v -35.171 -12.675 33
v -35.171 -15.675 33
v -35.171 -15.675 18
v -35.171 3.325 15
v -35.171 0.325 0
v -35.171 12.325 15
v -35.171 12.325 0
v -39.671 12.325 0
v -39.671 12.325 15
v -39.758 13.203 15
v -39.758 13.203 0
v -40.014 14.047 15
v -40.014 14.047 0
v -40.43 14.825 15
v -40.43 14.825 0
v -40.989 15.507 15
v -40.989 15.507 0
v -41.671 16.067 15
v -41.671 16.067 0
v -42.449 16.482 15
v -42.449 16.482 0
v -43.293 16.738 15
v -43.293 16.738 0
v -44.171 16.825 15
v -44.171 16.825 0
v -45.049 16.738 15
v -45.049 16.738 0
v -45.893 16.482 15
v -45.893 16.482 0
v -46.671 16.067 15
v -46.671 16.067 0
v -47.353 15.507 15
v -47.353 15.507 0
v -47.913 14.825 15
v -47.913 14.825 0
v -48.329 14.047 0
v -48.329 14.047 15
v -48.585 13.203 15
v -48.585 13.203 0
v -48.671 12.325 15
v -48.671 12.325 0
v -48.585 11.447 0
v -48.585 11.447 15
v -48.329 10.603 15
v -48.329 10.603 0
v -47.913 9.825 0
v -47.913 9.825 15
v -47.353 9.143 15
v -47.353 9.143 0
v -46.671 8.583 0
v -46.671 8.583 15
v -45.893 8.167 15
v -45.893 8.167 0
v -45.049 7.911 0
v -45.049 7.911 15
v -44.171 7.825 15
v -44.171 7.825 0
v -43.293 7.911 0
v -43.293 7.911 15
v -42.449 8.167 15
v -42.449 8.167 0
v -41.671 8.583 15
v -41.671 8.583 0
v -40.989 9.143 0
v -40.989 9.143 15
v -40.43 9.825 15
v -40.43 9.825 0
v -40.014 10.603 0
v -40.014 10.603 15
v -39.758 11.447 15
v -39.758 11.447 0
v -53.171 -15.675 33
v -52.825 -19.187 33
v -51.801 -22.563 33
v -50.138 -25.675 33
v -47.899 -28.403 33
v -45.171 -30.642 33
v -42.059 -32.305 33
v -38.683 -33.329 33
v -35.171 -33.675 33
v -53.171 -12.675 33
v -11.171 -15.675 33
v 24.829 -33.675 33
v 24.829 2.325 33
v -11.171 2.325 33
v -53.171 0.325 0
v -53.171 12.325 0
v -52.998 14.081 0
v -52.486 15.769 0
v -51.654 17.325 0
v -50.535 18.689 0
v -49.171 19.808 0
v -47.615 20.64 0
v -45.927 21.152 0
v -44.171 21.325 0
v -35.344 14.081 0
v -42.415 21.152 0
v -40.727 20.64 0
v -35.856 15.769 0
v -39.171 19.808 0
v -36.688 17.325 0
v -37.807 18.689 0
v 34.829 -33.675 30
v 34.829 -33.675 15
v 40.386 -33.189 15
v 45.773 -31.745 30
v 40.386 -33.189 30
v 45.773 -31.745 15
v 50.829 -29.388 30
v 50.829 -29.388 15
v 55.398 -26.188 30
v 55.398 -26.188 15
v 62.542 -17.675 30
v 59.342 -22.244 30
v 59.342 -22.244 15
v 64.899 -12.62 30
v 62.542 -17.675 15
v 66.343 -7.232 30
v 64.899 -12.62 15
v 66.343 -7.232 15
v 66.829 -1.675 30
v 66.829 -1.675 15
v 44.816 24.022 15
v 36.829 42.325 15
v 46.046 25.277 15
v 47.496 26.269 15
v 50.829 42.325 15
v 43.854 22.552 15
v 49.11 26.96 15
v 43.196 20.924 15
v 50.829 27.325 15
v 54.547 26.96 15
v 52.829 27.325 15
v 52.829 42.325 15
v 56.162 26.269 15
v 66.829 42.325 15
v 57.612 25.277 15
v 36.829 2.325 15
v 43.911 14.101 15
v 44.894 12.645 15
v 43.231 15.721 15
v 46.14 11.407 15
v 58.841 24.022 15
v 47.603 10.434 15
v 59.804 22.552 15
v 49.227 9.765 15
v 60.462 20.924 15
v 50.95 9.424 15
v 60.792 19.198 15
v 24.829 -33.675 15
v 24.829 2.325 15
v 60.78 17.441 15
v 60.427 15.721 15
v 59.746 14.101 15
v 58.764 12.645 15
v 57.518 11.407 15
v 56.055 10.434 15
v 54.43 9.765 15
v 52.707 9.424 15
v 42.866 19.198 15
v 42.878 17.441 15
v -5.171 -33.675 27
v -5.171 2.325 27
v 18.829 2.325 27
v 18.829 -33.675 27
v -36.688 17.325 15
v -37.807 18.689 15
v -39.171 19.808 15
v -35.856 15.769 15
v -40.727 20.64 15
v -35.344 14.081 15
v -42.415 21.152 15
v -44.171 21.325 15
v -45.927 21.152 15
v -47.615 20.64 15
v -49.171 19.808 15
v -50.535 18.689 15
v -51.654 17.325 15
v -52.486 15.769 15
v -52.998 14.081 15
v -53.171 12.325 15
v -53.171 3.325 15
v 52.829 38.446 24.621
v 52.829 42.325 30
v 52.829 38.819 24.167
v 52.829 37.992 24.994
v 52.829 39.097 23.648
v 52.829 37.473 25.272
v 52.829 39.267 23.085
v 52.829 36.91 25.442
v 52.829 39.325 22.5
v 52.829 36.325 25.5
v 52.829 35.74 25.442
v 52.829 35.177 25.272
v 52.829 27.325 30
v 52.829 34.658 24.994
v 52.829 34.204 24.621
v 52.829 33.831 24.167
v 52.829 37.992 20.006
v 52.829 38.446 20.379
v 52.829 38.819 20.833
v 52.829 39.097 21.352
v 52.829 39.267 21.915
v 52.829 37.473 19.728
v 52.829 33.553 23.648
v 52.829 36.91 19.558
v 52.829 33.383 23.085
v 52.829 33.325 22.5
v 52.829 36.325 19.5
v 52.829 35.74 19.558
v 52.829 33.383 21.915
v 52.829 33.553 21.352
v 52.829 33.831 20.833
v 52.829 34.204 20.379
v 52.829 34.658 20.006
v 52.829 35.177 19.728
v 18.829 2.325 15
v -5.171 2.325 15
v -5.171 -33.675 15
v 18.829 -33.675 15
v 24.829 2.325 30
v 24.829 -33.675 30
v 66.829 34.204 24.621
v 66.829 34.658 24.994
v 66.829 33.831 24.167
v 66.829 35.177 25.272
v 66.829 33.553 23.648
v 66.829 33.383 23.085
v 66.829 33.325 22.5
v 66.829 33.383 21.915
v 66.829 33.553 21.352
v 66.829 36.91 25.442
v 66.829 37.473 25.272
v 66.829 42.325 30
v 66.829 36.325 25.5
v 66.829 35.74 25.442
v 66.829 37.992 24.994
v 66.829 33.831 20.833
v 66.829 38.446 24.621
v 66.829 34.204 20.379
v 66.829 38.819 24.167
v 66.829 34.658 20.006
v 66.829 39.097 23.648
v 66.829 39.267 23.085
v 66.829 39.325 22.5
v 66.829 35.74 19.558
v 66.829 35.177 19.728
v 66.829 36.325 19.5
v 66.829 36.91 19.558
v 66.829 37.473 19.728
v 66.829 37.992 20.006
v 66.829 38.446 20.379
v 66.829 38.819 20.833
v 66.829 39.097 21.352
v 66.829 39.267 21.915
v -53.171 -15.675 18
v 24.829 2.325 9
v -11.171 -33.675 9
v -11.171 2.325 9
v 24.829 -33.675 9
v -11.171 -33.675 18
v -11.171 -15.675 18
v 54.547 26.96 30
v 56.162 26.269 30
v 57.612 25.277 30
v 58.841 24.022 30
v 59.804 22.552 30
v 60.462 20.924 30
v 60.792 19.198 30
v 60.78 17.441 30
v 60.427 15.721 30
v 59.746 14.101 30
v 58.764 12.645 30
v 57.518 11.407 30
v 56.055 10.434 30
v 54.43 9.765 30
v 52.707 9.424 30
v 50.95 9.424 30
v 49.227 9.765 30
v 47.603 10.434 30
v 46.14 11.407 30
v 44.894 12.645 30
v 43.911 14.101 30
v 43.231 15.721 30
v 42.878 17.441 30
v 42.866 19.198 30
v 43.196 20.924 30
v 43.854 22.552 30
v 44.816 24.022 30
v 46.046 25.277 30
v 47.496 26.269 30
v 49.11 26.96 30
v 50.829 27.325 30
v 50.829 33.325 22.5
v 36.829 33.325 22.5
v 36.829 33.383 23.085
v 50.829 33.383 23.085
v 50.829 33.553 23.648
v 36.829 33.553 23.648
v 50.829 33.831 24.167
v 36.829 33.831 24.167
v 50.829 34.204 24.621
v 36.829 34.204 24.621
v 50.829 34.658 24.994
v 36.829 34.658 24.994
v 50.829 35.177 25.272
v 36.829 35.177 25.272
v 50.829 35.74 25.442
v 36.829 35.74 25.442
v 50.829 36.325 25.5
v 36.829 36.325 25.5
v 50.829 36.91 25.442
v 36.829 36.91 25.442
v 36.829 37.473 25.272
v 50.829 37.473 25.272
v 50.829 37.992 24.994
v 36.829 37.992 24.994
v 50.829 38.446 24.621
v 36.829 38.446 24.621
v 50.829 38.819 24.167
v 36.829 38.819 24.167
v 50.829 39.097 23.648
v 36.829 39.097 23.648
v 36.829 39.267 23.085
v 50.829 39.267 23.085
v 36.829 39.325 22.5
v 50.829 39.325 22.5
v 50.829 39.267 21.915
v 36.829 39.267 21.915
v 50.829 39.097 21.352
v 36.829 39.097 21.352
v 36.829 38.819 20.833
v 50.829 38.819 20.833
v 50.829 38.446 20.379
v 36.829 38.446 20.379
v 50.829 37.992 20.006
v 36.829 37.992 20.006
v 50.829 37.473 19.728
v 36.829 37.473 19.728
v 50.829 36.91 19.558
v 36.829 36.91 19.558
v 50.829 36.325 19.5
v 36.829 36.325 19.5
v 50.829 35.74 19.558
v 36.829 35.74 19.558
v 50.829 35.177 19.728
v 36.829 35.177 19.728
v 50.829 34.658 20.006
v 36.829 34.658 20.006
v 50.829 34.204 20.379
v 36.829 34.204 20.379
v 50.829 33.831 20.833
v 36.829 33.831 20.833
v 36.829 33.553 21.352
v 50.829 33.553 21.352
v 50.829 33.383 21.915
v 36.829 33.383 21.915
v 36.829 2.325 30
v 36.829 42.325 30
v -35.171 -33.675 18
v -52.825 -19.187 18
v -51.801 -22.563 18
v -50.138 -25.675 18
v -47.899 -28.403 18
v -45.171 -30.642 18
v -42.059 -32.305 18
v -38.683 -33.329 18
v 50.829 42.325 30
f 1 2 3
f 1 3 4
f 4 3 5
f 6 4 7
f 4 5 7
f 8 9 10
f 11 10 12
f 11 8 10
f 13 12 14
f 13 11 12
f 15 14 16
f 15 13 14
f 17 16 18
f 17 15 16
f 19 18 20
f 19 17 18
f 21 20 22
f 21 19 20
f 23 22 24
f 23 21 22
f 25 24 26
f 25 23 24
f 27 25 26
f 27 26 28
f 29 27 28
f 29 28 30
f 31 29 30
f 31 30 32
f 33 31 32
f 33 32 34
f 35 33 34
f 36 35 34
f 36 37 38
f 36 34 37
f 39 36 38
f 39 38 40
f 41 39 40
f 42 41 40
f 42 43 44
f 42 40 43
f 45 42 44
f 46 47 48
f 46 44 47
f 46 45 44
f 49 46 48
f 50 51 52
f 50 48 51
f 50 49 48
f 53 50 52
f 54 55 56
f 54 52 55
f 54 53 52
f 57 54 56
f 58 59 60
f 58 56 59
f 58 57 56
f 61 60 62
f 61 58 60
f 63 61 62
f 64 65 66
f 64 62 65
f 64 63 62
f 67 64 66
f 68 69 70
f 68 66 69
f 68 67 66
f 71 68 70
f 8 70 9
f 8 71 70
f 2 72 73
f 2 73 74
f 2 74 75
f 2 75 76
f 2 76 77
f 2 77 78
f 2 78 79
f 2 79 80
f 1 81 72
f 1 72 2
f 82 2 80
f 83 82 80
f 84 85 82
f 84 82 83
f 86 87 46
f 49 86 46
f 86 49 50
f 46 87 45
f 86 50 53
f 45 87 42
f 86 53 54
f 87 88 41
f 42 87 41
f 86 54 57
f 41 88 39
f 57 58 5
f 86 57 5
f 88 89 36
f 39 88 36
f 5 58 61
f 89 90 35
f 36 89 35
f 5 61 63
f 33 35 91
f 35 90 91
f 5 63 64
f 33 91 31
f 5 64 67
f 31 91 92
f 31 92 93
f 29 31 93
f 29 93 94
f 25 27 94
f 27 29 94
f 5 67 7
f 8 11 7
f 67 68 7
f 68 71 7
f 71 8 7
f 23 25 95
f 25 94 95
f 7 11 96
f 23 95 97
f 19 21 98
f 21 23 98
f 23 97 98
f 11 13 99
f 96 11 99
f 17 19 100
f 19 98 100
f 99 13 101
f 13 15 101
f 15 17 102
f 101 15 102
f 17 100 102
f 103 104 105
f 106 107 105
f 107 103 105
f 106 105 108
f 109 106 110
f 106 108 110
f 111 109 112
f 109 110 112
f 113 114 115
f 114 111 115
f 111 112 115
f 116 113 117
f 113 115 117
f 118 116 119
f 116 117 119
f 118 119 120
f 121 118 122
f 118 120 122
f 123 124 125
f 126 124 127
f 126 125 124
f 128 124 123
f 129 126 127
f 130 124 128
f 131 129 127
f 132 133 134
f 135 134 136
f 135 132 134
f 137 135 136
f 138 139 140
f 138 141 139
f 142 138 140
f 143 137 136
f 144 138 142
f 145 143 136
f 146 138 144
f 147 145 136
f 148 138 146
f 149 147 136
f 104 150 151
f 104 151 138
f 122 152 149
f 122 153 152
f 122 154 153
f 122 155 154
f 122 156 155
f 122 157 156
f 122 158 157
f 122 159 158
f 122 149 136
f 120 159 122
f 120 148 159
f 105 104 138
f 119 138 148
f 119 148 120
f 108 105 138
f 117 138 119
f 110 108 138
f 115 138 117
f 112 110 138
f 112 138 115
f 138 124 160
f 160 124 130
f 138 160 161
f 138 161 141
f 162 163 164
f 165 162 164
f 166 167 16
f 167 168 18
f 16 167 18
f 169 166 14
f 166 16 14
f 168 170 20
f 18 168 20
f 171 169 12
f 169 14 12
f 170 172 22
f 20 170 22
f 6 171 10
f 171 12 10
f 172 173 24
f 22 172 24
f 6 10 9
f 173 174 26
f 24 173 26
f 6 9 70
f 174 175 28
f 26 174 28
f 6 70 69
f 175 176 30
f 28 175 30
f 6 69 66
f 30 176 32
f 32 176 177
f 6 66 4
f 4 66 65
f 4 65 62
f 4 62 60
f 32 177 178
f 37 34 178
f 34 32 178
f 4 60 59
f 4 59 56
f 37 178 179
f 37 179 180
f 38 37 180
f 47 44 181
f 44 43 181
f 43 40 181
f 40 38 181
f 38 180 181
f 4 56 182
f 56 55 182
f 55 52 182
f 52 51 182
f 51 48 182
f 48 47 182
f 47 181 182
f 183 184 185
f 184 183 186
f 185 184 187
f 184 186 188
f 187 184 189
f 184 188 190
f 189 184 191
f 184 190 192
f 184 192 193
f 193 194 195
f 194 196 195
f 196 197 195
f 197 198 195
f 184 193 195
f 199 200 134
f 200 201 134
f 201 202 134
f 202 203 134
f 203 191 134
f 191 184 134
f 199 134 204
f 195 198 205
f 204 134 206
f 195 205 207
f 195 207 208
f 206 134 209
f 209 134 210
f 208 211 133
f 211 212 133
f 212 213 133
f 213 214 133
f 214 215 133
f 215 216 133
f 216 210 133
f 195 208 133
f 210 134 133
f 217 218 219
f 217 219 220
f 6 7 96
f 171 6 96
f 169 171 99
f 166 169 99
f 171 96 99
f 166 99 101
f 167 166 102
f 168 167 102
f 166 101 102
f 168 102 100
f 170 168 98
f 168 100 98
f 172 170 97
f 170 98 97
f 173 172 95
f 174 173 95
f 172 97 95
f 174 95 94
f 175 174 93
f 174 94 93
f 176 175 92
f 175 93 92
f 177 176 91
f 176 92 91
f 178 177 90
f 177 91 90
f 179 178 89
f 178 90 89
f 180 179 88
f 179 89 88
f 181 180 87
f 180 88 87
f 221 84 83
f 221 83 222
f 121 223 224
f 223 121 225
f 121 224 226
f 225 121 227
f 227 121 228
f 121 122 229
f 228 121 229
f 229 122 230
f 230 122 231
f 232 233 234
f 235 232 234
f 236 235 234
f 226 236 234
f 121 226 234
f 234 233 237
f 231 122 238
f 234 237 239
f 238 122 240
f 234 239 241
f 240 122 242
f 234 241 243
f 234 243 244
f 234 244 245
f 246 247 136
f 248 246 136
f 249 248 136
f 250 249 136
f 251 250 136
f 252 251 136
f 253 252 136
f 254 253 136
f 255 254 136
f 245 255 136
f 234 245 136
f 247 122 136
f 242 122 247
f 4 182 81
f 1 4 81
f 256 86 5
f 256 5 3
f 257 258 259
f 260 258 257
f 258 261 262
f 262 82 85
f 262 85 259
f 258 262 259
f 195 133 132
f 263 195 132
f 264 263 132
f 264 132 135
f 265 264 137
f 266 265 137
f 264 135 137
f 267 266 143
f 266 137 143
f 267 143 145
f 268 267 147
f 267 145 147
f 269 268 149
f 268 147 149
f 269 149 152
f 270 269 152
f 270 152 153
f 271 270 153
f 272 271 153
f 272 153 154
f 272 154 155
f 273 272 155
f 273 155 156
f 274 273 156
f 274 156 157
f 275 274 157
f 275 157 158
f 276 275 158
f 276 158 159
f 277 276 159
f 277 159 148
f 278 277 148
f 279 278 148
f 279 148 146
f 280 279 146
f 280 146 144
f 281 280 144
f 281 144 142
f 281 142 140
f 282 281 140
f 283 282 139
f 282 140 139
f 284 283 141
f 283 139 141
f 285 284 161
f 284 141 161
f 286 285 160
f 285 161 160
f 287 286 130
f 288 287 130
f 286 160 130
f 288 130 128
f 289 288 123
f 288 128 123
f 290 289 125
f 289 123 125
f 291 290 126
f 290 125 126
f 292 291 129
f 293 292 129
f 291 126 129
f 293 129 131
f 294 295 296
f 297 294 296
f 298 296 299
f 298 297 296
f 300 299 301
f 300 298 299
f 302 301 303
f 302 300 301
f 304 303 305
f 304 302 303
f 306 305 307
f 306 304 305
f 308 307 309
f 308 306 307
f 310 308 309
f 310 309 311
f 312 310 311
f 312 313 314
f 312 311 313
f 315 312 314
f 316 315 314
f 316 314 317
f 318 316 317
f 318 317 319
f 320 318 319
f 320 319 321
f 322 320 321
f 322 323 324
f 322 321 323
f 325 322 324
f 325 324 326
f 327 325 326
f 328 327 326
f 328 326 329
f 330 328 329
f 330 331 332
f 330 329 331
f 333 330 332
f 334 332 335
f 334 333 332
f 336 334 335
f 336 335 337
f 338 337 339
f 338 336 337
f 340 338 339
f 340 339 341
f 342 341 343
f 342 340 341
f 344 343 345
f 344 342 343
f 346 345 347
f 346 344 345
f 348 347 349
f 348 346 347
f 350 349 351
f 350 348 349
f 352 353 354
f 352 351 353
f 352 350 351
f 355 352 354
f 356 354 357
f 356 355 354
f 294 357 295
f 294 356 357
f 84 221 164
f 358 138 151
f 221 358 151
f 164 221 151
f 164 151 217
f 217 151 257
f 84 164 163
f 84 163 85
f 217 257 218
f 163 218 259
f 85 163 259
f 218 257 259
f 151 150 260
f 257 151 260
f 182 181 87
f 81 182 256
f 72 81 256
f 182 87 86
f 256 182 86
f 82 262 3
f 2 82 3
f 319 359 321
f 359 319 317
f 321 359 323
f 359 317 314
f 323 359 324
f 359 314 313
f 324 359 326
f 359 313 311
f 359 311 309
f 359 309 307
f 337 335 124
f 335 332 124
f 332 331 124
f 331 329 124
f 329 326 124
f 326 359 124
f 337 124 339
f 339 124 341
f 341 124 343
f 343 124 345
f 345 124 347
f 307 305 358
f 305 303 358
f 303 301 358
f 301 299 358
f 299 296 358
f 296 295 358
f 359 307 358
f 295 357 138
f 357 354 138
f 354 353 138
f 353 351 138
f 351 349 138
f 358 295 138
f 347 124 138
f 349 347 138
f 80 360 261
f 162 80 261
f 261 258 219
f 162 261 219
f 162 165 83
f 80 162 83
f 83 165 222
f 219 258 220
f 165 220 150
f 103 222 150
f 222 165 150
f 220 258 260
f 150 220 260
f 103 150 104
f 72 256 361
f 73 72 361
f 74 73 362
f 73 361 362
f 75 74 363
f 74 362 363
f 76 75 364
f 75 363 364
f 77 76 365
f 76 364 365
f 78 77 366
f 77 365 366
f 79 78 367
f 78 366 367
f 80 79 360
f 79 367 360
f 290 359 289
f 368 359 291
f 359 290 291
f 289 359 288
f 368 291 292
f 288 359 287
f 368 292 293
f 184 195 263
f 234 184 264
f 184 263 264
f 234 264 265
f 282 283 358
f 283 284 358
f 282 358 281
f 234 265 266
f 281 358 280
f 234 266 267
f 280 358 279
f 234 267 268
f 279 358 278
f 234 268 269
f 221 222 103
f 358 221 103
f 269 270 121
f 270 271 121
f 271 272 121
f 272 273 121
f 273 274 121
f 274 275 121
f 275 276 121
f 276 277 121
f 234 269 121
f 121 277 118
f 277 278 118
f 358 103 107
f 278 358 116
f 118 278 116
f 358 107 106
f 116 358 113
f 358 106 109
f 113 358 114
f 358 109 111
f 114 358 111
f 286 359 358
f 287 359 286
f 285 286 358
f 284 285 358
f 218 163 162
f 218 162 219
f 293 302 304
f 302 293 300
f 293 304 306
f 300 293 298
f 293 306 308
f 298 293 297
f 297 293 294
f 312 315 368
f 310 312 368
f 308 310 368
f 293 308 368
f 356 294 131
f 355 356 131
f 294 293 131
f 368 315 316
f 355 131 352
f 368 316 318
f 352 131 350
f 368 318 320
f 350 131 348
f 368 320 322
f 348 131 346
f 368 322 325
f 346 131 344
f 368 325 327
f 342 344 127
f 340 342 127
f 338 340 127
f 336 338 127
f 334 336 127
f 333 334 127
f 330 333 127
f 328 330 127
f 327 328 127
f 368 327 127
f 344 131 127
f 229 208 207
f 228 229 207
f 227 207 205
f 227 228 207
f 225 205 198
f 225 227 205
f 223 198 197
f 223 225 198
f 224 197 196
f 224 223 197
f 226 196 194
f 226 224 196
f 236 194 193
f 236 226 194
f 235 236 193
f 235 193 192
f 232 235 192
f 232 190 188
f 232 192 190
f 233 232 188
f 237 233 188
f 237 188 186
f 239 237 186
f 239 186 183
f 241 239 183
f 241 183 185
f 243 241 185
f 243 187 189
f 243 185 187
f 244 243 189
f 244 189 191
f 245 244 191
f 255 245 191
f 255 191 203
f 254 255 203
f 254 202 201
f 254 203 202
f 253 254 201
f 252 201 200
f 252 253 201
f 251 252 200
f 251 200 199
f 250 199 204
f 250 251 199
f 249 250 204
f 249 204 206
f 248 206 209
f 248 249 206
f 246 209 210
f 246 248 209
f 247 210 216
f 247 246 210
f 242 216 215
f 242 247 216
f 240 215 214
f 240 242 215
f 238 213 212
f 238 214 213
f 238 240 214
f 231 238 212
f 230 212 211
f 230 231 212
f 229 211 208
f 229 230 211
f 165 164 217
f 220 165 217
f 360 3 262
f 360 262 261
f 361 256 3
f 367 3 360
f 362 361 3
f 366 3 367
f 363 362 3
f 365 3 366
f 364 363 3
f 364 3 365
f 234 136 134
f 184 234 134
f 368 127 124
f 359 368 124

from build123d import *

# Parameters (mm, degrees)
SKETCH_1_R               = 4.5
EXTRUDE_2_DEPTH          = 33
CUT_EXTRUDE_3_DEPTH      = 42
SKETCH_6_W               = 24
SKETCH_6_H               = 12
CUT_EXTRUDE_4_DEPTH      = 85.587779831
CUT_EXTRUDE_5_DEPTH      = 85.587779831
CUT_EXTRUDE_5_DEPTH_BACK = 85.587779831
SKETCH_7_W               = 78
SKETCH_7_H               = 9
CUT_EXTRUDE_6_DEPTH      = 85.587779831
CUT_EXTRUDE_6_DEPTH_BACK = 85.587779831
SKETCH_8_W               = 42
SKETCH_8_H               = 6
SKETCH_8_H_2             = 3
CUT_EXTRUDE_7_DEPTH      = 105.787400596
CUT_EXTRUDE_7_DEPTH_BACK = 105.787400596
SKETCH_9_R               = 3


with BuildPart() as part:
    # 草图1 → 凸台-拉伸2 (new body)
    with BuildSketch(Plane.XY):
        with BuildLine():
            Line((52.828829832, 42.32492556), (52.828829832, 27.32492556))
            ThreePointArc((52.828829832, 27.32492556), (51.828829832, 9.38065365), (50.828829832, 27.32492556))
            Line((50.828829832, 27.32492556), (50.828829832, 42.32492556))
            Line((50.828829832, 42.32492556), (36.828829832, 42.32492556))
            Line((36.828829832, 42.32492556), (36.828829832, 2.32492556))
            Line((36.828829832, 2.32492556), (-11.171170168, 2.32492556))
            Line((-11.171170168, 2.32492556), (-11.171170168, -15.67507444))
            Line((-11.171170168, -15.67507444), (-35.171170168, -15.67507444))
            Line((-35.171170168, -15.67507444), (-35.171170168, 12.32492556))
            ThreePointArc((-35.171170168, 12.32492556), (-44.171170168, 21.32492556), (-53.171170168, 12.32492556))
            Line((-53.171170168, 12.32492556), (-53.171170168, -15.67507444))
            ThreePointArc((-53.171170168, -15.67507444), (-47.899092229, -28.402996501), (-35.171170168, -33.67507444))
            Line((-35.171170168, -33.67507444), (34.828829832, -33.67507444))
            ThreePointArc((34.828829832, -33.67507444), (57.45624683, -24.302491437), (66.828829832, -1.67507444))
            Line((66.828829832, -1.67507444), (66.828829832, 42.32492556))
            Line((66.828829832, 42.32492556), (52.828829832, 42.32492556))
        make_face()
        with Locations((-44.171170168, 12.32492556)):
            Circle(SKETCH_1_R, mode=Mode.SUBTRACT)
    extrude(amount=EXTRUDE_2_DEPTH)

    # 草图4 → 切除-拉伸3 (cut)
    with BuildSketch(Plane.ZY.offset(53.171170168)):
        Polygon((0, 0.32492556), (18, -15.67507444), (18, -33.67507444), (0, -33.67507444), align=None)
        Polygon((15, 21.32492556), (15, 3.32492556), (33, -12.67507444), (33, 21.32492556), align=None)
    extrude(amount=-CUT_EXTRUDE_3_DEPTH, mode=Mode.SUBTRACT)

    # 草图6 → 切除-拉伸4 (cut, through all)
    with BuildSketch(Plane(origin=(0, 2.32492556, 0), x_dir=(1, 0, 0), z_dir=(0, 1, 0))):
        with Locations((6.828829832, -21)):
            Rectangle(SKETCH_6_W, SKETCH_6_H)
    extrude(amount=-CUT_EXTRUDE_4_DEPTH, mode=Mode.SUBTRACT)

    # 草图7 → 切除-拉伸5 (cut, two sides: drawn at the far end of the back side and taken through both)
    with BuildSketch(Plane(origin=(0, 2.32492556, 0), x_dir=(1, 0, 0), z_dir=(0, 1, 0)).offset(-CUT_EXTRUDE_5_DEPTH_BACK)):
        with Locations((27.828829832, -4.5)):
            Rectangle(SKETCH_7_W, SKETCH_7_H)
    extrude(amount=CUT_EXTRUDE_5_DEPTH + CUT_EXTRUDE_5_DEPTH_BACK, mode=Mode.SUBTRACT)

    # 草图8 → 切除-拉伸6 (cut, two sides: drawn at the far end of the back side and taken through both)
    with BuildSketch(Plane(origin=(0, 2.32492556, 0), x_dir=(1, 0, 0), z_dir=(0, 1, 0)).offset(-CUT_EXTRUDE_6_DEPTH_BACK)):
        with Locations((45.828829832, -12)):
            Rectangle(SKETCH_8_W, SKETCH_8_H)
        with Locations((45.828829832, -31.5)):
            Rectangle(SKETCH_8_W, SKETCH_8_H_2)
    extrude(amount=CUT_EXTRUDE_6_DEPTH + CUT_EXTRUDE_6_DEPTH_BACK, mode=Mode.SUBTRACT)

    # 草图9 → 切除-拉伸7 (cut, two sides: drawn at the far end of the back side and taken through both)
    with BuildSketch(Plane.ZY.offset(-36.828829832).offset(-CUT_EXTRUDE_7_DEPTH_BACK)):
        with Locations(Location((22.5, 36.32492556, 0), (0, 0, 270))):
            Circle(SKETCH_9_R)
    extrude(amount=CUT_EXTRUDE_7_DEPTH + CUT_EXTRUDE_7_DEPTH_BACK, mode=Mode.SUBTRACT)


solid = part.part
